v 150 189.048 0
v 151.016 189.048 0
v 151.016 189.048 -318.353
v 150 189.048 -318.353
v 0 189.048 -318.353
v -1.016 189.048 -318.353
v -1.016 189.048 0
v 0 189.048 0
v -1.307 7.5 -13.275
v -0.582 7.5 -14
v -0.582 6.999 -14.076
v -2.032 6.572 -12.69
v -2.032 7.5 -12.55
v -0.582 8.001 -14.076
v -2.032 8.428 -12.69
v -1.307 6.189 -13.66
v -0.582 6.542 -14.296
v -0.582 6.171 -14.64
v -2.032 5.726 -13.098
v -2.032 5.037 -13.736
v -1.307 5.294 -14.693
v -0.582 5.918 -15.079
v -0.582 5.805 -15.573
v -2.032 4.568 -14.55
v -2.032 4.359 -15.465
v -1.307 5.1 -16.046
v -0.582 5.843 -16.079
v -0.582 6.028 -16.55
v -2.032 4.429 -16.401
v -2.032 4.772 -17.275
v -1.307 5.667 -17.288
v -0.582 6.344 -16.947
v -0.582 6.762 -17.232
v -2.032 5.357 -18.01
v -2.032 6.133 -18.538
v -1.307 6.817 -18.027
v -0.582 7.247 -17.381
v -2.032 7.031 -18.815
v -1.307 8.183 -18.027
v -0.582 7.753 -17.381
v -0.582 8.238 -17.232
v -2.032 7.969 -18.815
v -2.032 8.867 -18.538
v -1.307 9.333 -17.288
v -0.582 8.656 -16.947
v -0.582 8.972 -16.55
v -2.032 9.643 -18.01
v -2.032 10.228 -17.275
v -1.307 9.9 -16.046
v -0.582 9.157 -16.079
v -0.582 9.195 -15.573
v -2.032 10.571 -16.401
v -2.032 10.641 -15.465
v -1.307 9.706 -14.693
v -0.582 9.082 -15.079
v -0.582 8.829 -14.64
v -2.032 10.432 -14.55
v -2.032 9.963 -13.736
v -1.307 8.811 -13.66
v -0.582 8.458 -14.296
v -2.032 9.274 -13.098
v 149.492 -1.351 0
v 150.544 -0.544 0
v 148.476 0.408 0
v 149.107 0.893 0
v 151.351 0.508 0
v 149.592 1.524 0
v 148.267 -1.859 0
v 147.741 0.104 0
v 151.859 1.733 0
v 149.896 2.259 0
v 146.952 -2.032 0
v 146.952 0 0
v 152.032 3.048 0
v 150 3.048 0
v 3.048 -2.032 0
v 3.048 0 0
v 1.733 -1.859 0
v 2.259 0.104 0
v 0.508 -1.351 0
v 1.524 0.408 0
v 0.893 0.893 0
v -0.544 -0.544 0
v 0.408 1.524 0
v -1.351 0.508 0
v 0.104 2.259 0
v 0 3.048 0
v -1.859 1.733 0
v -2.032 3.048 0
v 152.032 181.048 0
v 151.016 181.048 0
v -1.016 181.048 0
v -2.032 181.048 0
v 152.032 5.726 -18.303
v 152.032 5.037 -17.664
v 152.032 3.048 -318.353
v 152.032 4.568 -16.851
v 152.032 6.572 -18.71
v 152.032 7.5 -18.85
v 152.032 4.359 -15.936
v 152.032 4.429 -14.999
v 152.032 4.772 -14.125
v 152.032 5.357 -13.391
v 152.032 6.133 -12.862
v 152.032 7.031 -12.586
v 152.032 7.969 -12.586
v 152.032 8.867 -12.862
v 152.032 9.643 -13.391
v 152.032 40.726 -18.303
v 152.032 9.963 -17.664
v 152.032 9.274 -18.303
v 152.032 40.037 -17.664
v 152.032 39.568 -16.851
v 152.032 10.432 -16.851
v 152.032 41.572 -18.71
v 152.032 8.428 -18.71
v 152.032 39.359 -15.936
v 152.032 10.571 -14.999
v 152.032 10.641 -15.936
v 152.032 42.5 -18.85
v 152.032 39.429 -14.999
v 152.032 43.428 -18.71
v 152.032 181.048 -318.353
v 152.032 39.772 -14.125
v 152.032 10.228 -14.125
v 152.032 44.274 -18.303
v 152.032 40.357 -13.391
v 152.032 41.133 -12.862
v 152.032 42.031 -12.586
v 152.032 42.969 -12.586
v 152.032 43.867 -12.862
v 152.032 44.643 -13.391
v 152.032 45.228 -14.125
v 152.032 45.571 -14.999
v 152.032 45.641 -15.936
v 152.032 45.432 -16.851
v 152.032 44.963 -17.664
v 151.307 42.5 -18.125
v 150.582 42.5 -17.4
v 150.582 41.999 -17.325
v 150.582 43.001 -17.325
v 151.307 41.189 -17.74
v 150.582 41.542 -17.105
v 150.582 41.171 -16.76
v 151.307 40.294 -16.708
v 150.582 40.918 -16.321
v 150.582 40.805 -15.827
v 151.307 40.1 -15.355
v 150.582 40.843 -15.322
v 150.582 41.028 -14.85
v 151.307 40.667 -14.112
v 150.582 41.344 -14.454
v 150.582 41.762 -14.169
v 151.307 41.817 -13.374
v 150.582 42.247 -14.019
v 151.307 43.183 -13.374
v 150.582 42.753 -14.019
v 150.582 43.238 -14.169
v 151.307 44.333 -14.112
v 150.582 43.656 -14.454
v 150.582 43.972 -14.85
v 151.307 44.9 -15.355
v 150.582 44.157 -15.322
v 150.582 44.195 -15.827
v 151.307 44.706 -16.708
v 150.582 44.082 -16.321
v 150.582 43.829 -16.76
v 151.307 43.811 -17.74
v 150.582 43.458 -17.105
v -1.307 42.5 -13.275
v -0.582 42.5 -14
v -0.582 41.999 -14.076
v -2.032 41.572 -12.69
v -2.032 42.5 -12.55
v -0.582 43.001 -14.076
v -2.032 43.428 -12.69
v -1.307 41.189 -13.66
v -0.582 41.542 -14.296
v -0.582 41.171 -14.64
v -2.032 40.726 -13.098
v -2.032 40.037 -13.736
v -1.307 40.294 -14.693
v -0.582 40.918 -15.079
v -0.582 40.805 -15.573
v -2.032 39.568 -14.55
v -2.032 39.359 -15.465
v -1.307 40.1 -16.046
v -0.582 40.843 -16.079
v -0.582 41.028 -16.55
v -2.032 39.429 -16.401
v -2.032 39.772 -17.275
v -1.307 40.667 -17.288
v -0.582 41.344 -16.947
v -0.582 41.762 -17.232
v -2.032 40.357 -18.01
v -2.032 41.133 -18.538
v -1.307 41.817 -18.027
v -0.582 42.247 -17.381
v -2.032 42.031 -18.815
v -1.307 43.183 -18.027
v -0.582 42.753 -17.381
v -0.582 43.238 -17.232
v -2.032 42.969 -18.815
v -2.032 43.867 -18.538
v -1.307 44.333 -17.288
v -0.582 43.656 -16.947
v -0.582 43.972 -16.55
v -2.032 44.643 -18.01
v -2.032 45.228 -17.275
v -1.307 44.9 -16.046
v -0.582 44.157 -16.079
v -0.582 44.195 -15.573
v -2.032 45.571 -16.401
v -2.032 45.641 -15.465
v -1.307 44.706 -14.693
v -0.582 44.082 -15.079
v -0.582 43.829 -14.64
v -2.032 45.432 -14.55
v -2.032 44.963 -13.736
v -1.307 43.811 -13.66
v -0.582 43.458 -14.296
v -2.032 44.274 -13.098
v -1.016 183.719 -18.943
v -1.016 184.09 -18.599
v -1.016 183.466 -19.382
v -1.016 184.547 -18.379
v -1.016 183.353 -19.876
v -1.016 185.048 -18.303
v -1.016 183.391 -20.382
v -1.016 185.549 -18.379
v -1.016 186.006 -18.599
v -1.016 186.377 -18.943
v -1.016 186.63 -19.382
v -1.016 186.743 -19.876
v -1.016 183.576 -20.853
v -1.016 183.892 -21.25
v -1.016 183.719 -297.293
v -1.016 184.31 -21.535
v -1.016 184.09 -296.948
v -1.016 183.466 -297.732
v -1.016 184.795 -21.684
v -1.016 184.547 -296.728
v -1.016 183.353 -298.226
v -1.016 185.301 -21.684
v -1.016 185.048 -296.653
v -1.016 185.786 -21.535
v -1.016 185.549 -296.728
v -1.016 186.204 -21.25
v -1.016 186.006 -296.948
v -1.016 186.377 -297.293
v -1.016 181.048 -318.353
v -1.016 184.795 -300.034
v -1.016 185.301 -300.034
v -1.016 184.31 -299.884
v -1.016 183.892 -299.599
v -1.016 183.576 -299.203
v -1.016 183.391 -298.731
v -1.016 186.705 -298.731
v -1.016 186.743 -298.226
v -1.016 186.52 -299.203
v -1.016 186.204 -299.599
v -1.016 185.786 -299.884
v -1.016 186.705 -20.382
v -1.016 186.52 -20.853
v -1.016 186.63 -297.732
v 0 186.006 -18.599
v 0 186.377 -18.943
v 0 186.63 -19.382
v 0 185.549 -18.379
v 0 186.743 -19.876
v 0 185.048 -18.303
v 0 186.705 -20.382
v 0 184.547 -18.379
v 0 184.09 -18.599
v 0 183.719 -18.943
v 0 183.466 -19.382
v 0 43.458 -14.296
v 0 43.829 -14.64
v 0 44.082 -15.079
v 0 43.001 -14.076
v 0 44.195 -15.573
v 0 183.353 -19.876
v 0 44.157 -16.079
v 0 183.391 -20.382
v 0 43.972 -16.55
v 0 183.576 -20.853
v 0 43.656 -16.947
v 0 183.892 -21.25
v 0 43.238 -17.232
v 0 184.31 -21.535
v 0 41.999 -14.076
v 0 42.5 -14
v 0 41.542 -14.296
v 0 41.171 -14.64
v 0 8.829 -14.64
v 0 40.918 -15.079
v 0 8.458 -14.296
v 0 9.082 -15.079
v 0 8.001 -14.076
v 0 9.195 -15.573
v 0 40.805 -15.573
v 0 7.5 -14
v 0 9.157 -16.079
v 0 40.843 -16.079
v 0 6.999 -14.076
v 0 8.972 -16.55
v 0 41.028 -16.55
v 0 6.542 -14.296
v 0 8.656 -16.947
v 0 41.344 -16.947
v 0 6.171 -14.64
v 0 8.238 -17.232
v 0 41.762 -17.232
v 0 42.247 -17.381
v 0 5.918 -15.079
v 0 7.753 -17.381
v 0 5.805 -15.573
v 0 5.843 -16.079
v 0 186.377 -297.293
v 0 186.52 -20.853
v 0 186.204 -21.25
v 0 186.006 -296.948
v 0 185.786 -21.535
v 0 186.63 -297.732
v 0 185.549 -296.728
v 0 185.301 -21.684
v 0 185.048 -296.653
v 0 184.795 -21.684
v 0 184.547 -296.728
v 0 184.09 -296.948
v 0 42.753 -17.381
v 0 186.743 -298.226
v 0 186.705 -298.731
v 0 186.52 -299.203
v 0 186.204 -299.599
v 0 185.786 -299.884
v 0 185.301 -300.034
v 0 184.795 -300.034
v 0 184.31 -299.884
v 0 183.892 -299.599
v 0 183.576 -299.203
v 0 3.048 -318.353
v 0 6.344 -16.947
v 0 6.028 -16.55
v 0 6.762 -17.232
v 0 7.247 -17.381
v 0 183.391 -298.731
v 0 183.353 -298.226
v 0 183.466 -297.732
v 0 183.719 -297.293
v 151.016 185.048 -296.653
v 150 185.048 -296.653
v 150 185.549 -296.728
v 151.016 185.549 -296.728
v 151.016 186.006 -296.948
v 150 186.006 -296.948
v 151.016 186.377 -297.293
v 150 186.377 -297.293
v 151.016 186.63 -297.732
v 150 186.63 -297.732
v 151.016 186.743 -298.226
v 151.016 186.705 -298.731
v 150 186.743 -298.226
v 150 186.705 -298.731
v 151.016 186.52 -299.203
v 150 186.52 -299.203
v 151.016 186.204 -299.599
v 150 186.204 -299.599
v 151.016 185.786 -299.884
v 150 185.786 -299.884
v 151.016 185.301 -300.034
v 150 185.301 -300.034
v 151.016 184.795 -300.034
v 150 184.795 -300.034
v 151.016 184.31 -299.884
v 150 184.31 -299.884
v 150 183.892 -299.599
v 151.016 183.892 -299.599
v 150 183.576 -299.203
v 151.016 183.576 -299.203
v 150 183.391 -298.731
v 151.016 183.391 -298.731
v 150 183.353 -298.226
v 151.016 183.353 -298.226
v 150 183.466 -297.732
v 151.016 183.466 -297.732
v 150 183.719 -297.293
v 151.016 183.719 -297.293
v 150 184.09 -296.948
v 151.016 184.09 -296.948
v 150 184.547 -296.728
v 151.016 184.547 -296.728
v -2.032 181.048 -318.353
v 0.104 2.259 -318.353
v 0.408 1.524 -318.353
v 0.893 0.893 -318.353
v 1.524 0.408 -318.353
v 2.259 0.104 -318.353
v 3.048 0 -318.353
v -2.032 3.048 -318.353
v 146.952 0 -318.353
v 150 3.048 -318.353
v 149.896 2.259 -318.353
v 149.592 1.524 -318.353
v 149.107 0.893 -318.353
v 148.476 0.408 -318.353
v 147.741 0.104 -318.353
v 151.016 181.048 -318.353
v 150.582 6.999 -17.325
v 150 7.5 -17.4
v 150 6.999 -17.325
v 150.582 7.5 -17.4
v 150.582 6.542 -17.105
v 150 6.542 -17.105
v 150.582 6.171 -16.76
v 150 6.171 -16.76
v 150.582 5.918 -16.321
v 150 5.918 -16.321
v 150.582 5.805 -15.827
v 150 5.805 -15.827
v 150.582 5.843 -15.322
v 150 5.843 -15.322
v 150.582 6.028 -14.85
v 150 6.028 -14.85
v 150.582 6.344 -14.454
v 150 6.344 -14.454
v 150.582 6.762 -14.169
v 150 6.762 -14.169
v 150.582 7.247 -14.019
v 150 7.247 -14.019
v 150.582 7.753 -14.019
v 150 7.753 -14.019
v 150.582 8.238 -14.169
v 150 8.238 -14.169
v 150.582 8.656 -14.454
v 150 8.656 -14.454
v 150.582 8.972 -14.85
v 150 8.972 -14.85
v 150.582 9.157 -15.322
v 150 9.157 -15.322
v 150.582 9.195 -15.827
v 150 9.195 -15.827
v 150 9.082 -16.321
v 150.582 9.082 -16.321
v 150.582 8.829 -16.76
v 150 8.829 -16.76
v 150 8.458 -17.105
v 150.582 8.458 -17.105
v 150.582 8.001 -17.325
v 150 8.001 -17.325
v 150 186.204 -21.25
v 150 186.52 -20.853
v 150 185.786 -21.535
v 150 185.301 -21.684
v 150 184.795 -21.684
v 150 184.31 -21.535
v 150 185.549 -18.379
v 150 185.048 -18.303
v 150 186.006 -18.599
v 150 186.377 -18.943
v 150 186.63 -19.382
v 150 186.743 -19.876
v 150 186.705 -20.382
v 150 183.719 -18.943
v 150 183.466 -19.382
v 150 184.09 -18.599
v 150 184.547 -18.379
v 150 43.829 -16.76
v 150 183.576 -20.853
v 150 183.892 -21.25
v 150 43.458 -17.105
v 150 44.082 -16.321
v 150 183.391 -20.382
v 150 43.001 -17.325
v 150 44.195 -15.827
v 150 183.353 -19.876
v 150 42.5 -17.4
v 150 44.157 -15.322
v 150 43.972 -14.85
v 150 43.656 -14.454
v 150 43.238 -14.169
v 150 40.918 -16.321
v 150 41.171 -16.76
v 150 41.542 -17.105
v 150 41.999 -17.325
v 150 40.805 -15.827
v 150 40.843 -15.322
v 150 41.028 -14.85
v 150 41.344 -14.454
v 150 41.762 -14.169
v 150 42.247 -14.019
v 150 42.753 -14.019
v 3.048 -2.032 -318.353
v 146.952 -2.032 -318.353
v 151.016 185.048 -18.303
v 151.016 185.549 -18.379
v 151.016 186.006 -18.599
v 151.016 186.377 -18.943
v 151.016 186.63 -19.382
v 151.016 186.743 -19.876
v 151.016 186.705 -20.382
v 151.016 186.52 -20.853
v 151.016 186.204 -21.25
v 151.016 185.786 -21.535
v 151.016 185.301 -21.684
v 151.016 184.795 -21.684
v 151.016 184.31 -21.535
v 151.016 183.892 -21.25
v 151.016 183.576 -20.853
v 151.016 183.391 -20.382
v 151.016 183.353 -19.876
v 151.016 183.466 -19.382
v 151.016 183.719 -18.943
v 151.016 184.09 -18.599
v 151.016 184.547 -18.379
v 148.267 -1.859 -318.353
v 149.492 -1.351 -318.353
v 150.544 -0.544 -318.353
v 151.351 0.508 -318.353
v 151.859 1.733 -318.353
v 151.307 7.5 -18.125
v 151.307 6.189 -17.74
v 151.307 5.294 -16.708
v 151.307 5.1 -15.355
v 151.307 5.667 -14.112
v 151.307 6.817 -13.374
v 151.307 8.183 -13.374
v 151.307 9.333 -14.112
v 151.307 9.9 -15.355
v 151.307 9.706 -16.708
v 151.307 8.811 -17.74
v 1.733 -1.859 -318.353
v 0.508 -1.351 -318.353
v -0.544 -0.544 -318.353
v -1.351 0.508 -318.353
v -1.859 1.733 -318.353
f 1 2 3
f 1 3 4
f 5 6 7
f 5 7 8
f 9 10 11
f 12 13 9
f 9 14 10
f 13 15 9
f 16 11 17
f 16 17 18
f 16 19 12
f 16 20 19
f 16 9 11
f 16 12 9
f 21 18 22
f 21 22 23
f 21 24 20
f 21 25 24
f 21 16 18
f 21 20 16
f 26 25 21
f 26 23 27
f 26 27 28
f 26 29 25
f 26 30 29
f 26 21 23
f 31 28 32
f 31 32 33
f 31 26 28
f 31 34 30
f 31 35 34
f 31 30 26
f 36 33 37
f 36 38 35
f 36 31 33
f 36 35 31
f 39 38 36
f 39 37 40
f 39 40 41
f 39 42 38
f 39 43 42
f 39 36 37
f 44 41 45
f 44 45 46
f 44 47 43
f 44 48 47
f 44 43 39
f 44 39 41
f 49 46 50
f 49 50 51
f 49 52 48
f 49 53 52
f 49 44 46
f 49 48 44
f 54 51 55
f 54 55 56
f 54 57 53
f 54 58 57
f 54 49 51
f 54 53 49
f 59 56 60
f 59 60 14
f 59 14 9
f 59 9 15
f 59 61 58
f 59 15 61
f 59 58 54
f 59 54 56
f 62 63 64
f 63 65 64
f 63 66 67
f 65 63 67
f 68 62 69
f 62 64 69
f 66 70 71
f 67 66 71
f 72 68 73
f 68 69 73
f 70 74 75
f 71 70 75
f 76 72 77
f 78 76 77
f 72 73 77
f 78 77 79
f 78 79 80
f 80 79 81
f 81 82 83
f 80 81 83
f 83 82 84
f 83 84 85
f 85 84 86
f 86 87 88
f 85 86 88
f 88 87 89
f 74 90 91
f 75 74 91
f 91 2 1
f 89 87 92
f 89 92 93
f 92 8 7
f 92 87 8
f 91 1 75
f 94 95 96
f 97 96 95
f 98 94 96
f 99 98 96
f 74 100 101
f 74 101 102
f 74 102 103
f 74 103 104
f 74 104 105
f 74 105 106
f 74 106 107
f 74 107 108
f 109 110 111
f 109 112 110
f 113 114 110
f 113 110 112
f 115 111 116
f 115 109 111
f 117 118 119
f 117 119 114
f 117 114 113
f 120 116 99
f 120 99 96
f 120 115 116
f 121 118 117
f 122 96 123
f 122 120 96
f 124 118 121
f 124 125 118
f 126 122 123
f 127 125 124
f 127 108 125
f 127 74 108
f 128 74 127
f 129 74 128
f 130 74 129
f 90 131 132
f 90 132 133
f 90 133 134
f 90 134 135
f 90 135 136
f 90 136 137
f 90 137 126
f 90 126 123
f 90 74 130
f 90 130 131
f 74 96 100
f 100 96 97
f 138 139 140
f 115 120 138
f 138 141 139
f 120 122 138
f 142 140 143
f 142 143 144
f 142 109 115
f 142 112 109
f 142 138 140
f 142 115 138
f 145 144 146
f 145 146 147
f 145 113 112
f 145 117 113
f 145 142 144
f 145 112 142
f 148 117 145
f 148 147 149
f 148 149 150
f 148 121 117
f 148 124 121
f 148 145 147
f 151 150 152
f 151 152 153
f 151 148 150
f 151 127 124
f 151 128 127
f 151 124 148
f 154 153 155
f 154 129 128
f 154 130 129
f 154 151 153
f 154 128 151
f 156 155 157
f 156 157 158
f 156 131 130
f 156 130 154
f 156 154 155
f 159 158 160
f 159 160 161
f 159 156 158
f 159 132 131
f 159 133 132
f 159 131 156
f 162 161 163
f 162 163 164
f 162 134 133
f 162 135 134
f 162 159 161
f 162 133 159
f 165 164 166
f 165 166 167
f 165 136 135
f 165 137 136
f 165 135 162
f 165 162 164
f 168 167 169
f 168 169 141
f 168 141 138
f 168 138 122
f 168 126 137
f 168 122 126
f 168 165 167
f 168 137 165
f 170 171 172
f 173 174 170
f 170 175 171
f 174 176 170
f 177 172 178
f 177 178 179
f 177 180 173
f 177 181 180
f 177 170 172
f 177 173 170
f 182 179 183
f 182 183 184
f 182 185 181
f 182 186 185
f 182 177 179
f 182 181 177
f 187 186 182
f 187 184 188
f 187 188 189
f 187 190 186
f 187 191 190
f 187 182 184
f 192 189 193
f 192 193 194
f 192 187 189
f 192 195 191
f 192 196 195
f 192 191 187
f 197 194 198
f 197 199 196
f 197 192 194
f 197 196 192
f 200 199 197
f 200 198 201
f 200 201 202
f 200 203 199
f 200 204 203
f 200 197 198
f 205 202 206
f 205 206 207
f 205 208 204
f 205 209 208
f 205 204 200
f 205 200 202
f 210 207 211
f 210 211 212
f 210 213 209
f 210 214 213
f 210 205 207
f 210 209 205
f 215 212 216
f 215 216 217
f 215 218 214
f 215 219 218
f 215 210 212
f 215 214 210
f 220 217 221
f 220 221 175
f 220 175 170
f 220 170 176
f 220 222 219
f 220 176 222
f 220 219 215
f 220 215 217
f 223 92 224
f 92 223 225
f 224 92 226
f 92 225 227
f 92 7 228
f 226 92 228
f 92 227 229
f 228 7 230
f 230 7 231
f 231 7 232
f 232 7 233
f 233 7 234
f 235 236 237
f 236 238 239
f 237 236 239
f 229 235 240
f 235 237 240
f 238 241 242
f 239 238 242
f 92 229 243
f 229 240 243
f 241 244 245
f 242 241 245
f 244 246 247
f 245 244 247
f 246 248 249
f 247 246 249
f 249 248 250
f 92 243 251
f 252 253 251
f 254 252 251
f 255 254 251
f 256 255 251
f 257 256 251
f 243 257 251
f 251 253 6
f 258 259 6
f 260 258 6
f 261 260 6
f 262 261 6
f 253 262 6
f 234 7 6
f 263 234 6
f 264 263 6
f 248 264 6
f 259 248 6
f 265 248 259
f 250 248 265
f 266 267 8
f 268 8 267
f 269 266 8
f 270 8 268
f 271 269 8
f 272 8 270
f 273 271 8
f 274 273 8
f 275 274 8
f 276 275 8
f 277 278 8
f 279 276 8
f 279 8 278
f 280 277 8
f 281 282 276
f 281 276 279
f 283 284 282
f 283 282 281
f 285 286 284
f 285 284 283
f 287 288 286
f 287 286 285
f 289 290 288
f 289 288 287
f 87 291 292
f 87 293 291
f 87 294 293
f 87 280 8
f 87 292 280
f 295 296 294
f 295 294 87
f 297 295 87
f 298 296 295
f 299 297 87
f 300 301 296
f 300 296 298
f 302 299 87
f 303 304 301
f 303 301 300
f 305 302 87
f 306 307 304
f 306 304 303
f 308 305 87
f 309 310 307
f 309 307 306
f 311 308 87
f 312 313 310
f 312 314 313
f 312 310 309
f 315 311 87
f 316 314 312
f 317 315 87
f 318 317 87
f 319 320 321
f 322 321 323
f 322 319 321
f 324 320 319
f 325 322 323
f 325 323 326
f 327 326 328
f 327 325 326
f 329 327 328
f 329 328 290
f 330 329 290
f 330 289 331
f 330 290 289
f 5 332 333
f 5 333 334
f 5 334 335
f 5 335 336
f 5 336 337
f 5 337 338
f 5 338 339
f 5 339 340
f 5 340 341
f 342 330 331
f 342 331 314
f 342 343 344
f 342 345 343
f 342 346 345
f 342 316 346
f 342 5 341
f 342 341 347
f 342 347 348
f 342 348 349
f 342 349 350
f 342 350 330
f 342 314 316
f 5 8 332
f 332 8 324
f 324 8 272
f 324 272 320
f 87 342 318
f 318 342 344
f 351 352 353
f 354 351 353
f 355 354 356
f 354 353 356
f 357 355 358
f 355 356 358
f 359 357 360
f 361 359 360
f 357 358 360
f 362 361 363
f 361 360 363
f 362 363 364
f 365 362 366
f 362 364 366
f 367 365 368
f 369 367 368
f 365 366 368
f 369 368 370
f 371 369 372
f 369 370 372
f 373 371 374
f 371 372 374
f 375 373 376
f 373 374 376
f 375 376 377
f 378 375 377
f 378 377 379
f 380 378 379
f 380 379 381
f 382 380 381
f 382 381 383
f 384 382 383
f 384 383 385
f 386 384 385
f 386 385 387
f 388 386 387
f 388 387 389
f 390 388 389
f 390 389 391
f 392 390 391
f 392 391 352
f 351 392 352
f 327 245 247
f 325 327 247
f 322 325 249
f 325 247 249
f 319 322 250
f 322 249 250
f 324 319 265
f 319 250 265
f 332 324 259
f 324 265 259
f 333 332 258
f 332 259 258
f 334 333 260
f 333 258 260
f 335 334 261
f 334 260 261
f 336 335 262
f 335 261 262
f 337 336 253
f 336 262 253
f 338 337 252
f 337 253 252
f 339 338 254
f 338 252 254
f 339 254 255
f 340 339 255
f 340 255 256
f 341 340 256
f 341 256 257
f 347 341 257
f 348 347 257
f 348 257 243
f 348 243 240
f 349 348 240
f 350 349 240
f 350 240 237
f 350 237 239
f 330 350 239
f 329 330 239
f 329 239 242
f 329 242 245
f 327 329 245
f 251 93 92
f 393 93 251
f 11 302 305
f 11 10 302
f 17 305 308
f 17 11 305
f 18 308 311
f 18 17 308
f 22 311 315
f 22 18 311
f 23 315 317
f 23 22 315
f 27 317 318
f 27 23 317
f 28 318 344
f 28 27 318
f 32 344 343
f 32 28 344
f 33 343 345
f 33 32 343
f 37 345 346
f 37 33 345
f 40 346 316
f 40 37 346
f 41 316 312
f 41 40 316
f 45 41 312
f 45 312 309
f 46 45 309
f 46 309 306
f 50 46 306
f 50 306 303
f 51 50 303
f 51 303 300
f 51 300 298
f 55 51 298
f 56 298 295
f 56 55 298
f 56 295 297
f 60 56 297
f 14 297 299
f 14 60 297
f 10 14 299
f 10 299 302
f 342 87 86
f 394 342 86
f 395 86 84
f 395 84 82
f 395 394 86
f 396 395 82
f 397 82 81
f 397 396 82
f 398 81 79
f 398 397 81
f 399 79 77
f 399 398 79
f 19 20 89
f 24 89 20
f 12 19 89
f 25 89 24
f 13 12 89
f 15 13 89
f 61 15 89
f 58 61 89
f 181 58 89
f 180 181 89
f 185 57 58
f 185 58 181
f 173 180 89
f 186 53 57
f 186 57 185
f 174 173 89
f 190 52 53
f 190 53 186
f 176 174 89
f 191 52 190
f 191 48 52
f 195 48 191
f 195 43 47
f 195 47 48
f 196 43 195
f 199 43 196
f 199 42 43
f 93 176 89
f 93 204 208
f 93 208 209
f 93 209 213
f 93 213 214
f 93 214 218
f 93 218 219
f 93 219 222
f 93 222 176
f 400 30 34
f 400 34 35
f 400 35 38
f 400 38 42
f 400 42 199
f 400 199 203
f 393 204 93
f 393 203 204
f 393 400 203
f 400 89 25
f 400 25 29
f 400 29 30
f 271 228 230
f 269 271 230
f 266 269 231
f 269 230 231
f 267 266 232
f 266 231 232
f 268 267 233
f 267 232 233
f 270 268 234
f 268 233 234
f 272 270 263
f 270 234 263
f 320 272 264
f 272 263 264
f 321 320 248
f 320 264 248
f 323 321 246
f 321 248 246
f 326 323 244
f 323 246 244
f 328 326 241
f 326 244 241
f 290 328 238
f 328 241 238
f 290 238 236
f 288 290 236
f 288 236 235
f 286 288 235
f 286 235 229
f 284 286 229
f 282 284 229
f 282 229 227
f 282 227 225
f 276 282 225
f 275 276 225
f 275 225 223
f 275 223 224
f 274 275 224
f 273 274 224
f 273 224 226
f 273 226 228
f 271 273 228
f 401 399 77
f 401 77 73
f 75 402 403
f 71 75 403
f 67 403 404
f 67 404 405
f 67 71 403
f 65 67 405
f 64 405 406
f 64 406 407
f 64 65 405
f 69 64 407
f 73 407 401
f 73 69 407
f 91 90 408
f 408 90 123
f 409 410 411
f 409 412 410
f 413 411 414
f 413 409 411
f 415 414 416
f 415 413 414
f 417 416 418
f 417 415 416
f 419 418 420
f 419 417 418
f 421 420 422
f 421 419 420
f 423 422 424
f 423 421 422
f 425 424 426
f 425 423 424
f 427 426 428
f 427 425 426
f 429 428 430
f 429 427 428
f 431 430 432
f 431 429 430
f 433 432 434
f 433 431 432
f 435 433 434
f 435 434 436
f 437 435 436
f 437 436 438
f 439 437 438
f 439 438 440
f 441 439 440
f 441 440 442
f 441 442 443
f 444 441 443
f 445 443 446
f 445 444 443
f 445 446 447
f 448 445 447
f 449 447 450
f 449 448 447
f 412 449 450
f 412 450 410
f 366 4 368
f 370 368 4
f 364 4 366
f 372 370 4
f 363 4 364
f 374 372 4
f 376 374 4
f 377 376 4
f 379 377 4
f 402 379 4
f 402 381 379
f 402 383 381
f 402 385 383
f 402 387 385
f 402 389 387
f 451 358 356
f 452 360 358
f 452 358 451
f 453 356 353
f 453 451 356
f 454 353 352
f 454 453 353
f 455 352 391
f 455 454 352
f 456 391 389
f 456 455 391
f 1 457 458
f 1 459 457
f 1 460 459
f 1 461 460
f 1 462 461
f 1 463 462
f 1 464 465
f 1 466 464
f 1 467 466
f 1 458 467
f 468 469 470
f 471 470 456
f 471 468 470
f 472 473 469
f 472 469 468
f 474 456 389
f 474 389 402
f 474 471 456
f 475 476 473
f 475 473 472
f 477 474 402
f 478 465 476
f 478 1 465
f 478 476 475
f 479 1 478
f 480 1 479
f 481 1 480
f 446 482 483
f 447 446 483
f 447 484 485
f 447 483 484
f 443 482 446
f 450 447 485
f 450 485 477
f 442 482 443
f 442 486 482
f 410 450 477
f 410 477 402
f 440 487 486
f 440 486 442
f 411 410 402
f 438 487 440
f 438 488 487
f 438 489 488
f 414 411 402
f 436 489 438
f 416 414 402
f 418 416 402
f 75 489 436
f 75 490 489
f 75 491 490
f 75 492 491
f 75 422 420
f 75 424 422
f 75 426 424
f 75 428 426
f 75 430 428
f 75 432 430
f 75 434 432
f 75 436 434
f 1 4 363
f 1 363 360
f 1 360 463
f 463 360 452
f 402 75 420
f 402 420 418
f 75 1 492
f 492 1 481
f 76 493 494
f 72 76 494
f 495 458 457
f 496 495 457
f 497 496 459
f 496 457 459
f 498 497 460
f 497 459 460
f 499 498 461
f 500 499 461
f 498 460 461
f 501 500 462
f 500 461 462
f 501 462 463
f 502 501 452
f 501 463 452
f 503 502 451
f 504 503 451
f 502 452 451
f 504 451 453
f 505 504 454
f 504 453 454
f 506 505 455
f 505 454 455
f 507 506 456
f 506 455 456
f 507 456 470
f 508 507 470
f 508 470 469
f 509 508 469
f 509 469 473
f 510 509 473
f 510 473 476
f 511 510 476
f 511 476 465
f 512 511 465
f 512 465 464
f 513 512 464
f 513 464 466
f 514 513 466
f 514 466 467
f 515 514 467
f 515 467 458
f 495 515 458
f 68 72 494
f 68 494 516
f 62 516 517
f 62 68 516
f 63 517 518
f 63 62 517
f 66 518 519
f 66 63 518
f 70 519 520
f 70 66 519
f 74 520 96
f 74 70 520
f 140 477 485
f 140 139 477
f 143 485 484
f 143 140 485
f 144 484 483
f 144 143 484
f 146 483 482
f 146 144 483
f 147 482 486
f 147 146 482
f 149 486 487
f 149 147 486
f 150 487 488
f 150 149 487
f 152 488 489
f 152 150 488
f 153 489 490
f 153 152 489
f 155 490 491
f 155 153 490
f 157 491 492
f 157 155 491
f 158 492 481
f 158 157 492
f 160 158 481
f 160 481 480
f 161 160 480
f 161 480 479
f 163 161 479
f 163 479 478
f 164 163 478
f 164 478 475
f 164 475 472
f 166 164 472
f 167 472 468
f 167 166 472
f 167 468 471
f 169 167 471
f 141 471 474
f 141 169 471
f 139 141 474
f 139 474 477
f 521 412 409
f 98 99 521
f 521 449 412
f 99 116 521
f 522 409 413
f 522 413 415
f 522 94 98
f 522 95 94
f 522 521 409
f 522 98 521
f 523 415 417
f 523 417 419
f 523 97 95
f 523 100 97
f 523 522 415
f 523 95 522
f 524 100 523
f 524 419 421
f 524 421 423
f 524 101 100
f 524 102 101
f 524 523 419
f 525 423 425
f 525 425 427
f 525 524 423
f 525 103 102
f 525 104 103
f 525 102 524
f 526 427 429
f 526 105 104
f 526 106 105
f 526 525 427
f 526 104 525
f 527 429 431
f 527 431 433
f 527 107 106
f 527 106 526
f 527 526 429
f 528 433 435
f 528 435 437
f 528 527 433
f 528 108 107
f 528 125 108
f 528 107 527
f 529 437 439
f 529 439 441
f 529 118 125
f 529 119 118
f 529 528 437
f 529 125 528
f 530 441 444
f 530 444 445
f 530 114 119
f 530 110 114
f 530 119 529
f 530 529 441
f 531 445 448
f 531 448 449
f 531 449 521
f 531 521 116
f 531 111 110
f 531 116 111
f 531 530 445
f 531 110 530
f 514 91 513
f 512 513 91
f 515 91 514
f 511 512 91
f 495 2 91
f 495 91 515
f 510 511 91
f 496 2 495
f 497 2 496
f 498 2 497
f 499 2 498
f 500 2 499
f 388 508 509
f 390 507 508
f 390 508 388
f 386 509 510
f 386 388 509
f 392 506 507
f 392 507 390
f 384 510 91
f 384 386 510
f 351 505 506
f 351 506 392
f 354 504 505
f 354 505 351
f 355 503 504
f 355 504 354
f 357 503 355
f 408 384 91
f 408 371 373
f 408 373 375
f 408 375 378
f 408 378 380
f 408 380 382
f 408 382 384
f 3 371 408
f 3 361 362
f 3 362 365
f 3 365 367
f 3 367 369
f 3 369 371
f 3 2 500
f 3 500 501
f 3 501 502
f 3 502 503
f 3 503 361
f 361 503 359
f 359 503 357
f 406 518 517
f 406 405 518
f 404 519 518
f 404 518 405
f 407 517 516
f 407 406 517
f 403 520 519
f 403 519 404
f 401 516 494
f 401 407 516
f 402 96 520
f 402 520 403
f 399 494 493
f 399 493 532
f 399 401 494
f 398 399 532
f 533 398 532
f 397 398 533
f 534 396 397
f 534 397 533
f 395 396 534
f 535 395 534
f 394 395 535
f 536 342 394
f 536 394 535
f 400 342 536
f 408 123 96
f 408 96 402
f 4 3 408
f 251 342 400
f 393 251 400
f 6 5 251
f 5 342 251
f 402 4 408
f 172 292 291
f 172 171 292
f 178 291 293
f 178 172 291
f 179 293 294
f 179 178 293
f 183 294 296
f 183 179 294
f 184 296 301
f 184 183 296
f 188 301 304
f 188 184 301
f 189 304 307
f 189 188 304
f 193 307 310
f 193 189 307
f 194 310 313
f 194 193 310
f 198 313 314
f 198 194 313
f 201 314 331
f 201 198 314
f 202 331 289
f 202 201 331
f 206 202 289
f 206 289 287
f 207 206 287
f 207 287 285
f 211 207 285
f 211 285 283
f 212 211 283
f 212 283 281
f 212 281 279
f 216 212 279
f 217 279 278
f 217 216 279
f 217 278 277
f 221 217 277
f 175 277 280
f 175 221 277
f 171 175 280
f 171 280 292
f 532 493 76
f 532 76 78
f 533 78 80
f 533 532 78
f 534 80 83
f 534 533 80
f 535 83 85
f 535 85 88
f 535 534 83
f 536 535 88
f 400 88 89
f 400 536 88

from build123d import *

# Parameters (mm, degrees)
SKETCH1_W                                      = 150
SKETCH1_H                                      = 318.3528
BASE_FLANGE1_DEPTH                             = 2.032
EDGE_FLANGE1_STRIP_W                           = 14.224
EDGE_FLANGE1_STRIP_H                           = 2.032
EDGE_FLANGE1_STRIP_CUT_DEPTH                   = 318.3528
EDGE_FLANGE1_STRIP_2_W                         = 14.224
EDGE_FLANGE1_STRIP_2_H                         = 2.032
EDGE_FLANGE1_STRIP_CUT_2_DEPTH                 = 318.3528
EDGE_FLANGE1_DEPTH                             = 318.3528
EDGE_FLANGE1_BEND_DEPTH                        = 318.3528
SKETCH9_W                                      = 318.3528
SKETCH9_H                                      = 8
CUT_EXTRUDE1_DEPTH                             = 1.016
SKETCH10_W                                     = 318.3528
SKETCH10_H                                     = 8
CUT_EXTRUDE3_DEPTH                             = 1.016
M3_CLEARANCE_HOLE1_D                           = 3.4
CSK_FOR_M3_FLAT_HEAD_MACHINE_SCREW1_AT_2_COUNT = 2
CSK_FOR_M3_FLAT_HEAD_MACHINE_SCREW1_AT_2_PITCH = 35
CSK_FOR_M3_FLAT_HEAD_MACHINE_SCREW2_AT_2_COUNT = 2
CSK_FOR_M3_FLAT_HEAD_MACHINE_SCREW2_AT_2_PITCH = 35


# Sheet-metal steps are written as plain solids
with BuildPart() as part:
    # Sketch1 → Base-Flange1 (new body)
    with BuildSketch(Plane(origin=(0, 0, 0), x_dir=(1, 0, 0), z_dir=(0, 1, 0))):
        with Locations((75, 159.1764)):
            Rectangle(SKETCH1_W, SKETCH1_H)
    extrude(amount=-BASE_FLANGE1_DEPTH)

    # Edge-Flange1 strip (across the edge) → Edge-Flange1 strip cut (cut)
    with BuildSketch(Plane(origin=(150, 0, 0), x_dir=(-1, 0, 0), z_dir=(0, 0, -1))):
        with Locations((-4.064, -1.016)):
            Rectangle(EDGE_FLANGE1_STRIP_W, EDGE_FLANGE1_STRIP_H)
    extrude(amount=EDGE_FLANGE1_STRIP_CUT_DEPTH, mode=Mode.SUBTRACT)

    # Edge-Flange1 strip 2 (across the edge) → Edge-Flange1 strip cut 2 (cut)
    with BuildSketch(Plane.XY.offset(-318.3528)):
        with Locations((-4.064, -1.016)):
            Rectangle(EDGE_FLANGE1_STRIP_2_W, EDGE_FLANGE1_STRIP_2_H)
    extrude(amount=EDGE_FLANGE1_STRIP_CUT_2_DEPTH, mode=Mode.SUBTRACT)

    # Edge-Flange1 section (across the edge) → Edge-Flange1 (add)
    with BuildSketch(Plane(origin=(150, 0, 0), x_dir=(-1, 0, 0), z_dir=(0, 0, -1))):
        with BuildLine():
            Line((-2.032, 3.048), (-2.032, 189.048))
            Line((-2.032, 189.048), (0, 189.048))
            Line((0, 189.048), (0, 3.048))
            ThreePointArc((0, 3.048), (0.892738531, 0.892738531), (3.048, 0))
            Line((3.048, 0), (3.048, -2.032))
            ThreePointArc((3.048, -2.032), (-0.544102448, -0.544102448), (-2.032, 3.048))
        make_face()
    extrude(amount=EDGE_FLANGE1_DEPTH)

    # Edge-Flange1 section 2 (across the edge) → Edge-Flange1 bend (add)
    with BuildSketch(Plane.XY.offset(-318.3528)):
        with BuildLine():
            Line((-2.032, 3.048), (-2.032, 189.048))
            Line((-2.032, 189.048), (0, 189.048))
            Line((0, 189.048), (0, 3.048))
            ThreePointArc((0, 3.048), (0.892738531, 0.892738531), (3.048, 0))
            Line((3.048, 0), (3.048, -2.032))
            ThreePointArc((3.048, -2.032), (-0.544102448, -0.544102448), (-2.032, 3.048))
        make_face()
    extrude(amount=EDGE_FLANGE1_BEND_DEPTH)

    # Sketch9 → Cut-Extrude1 (cut)
    with BuildSketch(Plane(origin=(152.032, 0, 0), x_dir=(0, 0, -1), z_dir=(1, 0, 0))):
        with Locations((159.1764, 185.048)):
            Rectangle(SKETCH9_W, SKETCH9_H)
    extrude(amount=-CUT_EXTRUDE1_DEPTH, mode=Mode.SUBTRACT)

    # Sketch10 → Cut-Extrude3 (cut)
    with BuildSketch(Plane(origin=(-2.032, 0, -3.175), x_dir=(0, 0, -1), z_dir=(1, 0, 0))):
        with Locations((156.0014, 185.048)):
            Rectangle(SKETCH10_W, SKETCH10_H)
    extrude(amount=CUT_EXTRUDE3_DEPTH, mode=Mode.SUBTRACT)

    # M3 Clearance Hole1 (through all)
    with Locations(Plane(origin=(151.016, 0, 0), x_dir=(0, 0, -1), z_dir=(1, 0, 0))):
        with Locations((20.003324657, 185.048), (298.3528, 185.048)):
            Hole(M3_CLEARANCE_HOLE1_D / 2)

    # Sketch20 → CSK for M3 Flat Head Machine Screw1 (revolve, cut)
    with BuildSketch(Plane(origin=(152.032, 42.5, -15.7004), x_dir=(0, 0, -1), z_dir=(0, 1, 0))):
        Polygon((0, 0), (0, 2.032), (1.7, 2.032), (1.7, 1.45), (3.15, 0), align=None)
    csk_for_m3_flat_head_machine_screw1 = revolve(axis=Axis((158.382, 42.5, -15.7004), (-1, 0, 0)), mode=Mode.SUBTRACT)

    # CSK for M3 Flat Head Machine Screw1 at 2: CSK for M3 Flat Head Machine Screw1 ×2
    with Locations(*[(0, -i * CSK_FOR_M3_FLAT_HEAD_MACHINE_SCREW1_AT_2_PITCH, 0) for i in range(1, CSK_FOR_M3_FLAT_HEAD_MACHINE_SCREW1_AT_2_COUNT)]):
        add(csk_for_m3_flat_head_machine_screw1, mode=Mode.SUBTRACT)

    # Sketch23 → CSK for M3 Flat Head Machine Screw2 (revolve, cut)
    with BuildSketch(Plane(origin=(-2.032, 42.5, -15.7004), x_dir=(0, 0, 1), z_dir=(0, 1, 0))):
        Polygon((0, 0), (0, 2.032), (1.7, 2.032), (1.7, 1.45), (3.15, 0), align=None)
    csk_for_m3_flat_head_machine_screw2 = revolve(axis=Axis((-8.382, 42.5, -15.7004), (1, 0, 0)), mode=Mode.SUBTRACT)

    # CSK for M3 Flat Head Machine Screw2 at 2: CSK for M3 Flat Head Machine Screw2 ×2
    with Locations(*[(0, -i * CSK_FOR_M3_FLAT_HEAD_MACHINE_SCREW2_AT_2_PITCH, 0) for i in range(1, CSK_FOR_M3_FLAT_HEAD_MACHINE_SCREW2_AT_2_COUNT)]):
        add(csk_for_m3_flat_head_machine_screw2, mode=Mode.SUBTRACT)


solid = part.part
